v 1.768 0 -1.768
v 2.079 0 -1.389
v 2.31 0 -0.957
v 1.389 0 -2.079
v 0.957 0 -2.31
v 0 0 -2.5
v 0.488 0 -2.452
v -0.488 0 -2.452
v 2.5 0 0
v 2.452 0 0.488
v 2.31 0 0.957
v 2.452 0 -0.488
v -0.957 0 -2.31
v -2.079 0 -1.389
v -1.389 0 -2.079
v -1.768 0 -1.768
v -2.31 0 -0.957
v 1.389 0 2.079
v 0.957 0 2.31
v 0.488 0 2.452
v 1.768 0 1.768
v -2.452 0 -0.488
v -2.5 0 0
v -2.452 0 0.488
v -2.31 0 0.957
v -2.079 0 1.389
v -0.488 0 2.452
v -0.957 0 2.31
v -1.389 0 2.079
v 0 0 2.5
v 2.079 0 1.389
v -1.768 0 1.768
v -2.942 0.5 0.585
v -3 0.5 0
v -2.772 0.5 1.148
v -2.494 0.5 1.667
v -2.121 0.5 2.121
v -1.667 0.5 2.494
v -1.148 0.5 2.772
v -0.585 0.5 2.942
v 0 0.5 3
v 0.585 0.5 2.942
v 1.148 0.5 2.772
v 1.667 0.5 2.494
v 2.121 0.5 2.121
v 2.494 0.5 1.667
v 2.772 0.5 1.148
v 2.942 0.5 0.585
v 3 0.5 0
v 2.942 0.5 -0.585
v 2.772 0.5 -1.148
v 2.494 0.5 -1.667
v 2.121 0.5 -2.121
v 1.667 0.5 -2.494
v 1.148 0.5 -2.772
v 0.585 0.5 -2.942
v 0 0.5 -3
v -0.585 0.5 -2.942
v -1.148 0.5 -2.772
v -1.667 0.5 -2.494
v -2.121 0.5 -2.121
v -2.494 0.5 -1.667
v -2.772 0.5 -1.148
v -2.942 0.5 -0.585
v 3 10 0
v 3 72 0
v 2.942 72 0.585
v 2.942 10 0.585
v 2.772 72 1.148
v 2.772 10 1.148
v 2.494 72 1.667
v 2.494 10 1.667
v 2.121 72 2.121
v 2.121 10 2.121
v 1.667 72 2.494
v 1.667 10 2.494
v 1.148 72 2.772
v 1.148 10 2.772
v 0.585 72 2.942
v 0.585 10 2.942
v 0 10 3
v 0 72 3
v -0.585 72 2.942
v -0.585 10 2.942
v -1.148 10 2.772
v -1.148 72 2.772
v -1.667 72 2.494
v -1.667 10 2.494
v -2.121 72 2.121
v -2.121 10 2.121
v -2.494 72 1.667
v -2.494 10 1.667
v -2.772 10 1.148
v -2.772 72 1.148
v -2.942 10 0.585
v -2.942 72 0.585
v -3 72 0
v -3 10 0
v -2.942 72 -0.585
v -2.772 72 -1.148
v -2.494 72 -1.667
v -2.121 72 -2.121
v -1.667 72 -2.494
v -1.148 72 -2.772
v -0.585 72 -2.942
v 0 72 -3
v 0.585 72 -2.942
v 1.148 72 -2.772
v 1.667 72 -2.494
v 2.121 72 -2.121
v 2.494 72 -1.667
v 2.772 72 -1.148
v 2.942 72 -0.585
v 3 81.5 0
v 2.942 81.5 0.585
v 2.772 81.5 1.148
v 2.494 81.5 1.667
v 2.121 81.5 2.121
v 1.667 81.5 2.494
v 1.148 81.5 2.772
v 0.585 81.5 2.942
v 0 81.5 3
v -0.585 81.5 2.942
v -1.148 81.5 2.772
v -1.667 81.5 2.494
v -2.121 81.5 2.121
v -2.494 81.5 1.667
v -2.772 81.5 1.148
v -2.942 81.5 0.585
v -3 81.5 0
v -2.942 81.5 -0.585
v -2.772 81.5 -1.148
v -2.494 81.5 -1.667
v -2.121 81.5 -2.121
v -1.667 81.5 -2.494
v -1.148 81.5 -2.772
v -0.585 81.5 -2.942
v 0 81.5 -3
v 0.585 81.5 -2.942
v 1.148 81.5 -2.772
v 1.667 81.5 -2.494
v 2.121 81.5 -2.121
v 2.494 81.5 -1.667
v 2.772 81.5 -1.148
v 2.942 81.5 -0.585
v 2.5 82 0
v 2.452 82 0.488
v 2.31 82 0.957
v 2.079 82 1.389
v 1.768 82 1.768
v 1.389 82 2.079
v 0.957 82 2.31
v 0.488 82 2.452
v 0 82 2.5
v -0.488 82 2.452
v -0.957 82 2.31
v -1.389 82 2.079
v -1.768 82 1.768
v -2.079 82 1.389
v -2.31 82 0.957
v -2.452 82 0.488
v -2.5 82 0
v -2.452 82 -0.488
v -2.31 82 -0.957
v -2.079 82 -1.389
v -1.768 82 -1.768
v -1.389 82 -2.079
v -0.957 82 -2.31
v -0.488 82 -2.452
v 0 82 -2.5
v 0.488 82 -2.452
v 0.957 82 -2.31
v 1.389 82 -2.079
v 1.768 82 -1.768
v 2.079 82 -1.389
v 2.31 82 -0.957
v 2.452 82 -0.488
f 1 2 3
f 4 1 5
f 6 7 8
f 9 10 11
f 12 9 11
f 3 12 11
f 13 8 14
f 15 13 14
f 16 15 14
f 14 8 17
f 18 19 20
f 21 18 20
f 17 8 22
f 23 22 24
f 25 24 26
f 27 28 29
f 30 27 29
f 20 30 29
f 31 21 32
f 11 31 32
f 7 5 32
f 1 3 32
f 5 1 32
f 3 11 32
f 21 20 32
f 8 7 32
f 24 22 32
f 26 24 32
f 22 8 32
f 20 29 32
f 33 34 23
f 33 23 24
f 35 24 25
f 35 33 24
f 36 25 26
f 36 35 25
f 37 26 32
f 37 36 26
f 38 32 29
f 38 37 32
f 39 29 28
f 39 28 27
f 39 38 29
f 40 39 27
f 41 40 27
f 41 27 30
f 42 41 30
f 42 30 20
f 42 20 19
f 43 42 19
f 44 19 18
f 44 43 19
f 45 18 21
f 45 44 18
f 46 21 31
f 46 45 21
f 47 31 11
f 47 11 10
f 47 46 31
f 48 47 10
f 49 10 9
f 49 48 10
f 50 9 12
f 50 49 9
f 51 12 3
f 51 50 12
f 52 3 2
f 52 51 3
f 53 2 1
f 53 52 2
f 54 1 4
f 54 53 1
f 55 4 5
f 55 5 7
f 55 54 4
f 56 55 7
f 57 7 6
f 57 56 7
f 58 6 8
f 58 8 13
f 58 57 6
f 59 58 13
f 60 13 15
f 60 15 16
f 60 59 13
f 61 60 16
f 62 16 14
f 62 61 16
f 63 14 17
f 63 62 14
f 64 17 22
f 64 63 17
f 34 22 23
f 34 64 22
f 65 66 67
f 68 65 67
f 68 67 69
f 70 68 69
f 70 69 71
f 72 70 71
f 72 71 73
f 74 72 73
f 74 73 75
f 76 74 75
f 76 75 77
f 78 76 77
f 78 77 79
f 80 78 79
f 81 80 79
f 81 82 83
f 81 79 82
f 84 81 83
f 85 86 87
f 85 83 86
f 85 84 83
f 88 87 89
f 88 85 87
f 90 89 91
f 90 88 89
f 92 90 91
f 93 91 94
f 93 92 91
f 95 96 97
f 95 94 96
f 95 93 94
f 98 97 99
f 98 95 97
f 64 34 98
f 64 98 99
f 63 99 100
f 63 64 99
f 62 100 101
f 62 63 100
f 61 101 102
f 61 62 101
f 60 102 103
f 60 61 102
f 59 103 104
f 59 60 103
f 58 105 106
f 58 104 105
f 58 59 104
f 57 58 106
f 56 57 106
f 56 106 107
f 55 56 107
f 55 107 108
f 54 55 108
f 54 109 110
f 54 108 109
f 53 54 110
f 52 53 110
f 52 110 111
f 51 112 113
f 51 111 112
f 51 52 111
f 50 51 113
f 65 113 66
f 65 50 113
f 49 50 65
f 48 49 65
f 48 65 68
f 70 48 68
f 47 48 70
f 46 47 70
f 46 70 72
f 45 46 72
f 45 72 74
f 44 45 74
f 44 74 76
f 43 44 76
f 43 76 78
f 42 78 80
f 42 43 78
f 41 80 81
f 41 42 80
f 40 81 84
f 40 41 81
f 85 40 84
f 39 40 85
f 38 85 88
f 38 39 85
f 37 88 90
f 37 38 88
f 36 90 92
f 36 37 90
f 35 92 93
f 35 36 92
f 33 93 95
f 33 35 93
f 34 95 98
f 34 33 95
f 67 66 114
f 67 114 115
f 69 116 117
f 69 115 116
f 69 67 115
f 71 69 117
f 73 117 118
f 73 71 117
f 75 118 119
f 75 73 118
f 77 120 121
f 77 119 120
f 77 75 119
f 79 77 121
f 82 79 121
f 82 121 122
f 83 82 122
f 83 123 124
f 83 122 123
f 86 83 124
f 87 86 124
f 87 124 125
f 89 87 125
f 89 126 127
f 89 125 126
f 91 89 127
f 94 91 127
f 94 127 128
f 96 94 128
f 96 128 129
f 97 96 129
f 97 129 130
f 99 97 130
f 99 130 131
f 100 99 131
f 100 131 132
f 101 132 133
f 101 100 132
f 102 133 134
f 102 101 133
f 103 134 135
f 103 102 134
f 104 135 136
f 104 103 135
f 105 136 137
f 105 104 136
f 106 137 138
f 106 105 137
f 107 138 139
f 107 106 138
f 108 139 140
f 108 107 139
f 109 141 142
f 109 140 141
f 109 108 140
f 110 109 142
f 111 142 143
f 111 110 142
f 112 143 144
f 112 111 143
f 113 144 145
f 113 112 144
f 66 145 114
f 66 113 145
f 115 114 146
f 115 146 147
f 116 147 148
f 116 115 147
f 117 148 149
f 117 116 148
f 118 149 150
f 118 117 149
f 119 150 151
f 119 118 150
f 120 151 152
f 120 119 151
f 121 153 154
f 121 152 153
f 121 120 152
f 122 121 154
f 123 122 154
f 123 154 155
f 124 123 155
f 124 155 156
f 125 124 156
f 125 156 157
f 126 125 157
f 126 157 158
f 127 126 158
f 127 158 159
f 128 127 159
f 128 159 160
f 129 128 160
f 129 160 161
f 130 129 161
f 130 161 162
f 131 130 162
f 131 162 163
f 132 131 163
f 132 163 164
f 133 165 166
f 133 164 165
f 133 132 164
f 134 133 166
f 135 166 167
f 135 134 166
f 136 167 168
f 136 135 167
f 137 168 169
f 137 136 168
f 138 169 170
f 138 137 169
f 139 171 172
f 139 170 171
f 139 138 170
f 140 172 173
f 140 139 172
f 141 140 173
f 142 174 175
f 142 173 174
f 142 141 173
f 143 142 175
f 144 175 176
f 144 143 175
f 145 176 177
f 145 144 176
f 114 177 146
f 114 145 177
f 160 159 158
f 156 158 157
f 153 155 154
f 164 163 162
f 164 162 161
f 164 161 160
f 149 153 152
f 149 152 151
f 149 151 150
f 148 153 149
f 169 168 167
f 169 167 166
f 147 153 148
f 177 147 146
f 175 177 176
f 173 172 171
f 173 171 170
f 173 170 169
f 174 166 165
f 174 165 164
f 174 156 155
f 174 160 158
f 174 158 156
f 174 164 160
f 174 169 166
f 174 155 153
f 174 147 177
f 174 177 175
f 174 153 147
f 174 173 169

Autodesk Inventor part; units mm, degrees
ref_plane "YZ Plane" through (0, 0, 0) normal (1, 0, 0) x (0, 1, 0)
ref_plane "XZ Plane" through (0, 0, 0) normal (0, 1, 0) x (-1, 0, 0)
ref_plane "XY Plane" through (0, 0, 0) normal (0, 0, 1) x (1, 0, 0)
sketch "Sketch1" plane through (0, 0, 0) normal (0, 1, 0) x (-1, 0, 0)
  circle A0 centre (0, 0) radius 3
  dimension "d3" = 6
extrude "Extrusion2" add sketch "Sketch1" along normal blind 10
thread "Thread1" size "M6x1" class "6g" standard "ANSI Metric M Profile" length 10
sketch "Sketch3" plane through (0, 10, 0) normal (0, 1, 0) x (1, 0, 0)
  circle A0 centre (0, 0) radius 3
  dimension "d8" = 6
extrude "Extrusion3" add sketch "Sketch3" along normal blind 62
sketch "Sketch4" plane through (0, 72, 0) normal (0, 1, 0) x (1, 0, 0)
  circle A0 centre (0, 0) radius 3 projected
  circle A1 centre (0, 0) radius 3
  dimension "d11" = 6
extrude "Extrusion4" add sketch "Sketch4" along normal blind 10
thread "Thread2" size "M6x1" class "6g" standard "ANSI Metric M Profile" length 10
chamfer "Chamfer1" distance 0.5 distance2 0.5 1 edges at (-3, 82, 0) measured on face at (-0.5351, 82, -1.0949)
chamfer "Chamfer2" distance 0.5 distance2 0.5 1 edges at (3, 0, 0) measured on face at (0.5351, 0, 1.0949)
properties part number "cylinder head bolt"
